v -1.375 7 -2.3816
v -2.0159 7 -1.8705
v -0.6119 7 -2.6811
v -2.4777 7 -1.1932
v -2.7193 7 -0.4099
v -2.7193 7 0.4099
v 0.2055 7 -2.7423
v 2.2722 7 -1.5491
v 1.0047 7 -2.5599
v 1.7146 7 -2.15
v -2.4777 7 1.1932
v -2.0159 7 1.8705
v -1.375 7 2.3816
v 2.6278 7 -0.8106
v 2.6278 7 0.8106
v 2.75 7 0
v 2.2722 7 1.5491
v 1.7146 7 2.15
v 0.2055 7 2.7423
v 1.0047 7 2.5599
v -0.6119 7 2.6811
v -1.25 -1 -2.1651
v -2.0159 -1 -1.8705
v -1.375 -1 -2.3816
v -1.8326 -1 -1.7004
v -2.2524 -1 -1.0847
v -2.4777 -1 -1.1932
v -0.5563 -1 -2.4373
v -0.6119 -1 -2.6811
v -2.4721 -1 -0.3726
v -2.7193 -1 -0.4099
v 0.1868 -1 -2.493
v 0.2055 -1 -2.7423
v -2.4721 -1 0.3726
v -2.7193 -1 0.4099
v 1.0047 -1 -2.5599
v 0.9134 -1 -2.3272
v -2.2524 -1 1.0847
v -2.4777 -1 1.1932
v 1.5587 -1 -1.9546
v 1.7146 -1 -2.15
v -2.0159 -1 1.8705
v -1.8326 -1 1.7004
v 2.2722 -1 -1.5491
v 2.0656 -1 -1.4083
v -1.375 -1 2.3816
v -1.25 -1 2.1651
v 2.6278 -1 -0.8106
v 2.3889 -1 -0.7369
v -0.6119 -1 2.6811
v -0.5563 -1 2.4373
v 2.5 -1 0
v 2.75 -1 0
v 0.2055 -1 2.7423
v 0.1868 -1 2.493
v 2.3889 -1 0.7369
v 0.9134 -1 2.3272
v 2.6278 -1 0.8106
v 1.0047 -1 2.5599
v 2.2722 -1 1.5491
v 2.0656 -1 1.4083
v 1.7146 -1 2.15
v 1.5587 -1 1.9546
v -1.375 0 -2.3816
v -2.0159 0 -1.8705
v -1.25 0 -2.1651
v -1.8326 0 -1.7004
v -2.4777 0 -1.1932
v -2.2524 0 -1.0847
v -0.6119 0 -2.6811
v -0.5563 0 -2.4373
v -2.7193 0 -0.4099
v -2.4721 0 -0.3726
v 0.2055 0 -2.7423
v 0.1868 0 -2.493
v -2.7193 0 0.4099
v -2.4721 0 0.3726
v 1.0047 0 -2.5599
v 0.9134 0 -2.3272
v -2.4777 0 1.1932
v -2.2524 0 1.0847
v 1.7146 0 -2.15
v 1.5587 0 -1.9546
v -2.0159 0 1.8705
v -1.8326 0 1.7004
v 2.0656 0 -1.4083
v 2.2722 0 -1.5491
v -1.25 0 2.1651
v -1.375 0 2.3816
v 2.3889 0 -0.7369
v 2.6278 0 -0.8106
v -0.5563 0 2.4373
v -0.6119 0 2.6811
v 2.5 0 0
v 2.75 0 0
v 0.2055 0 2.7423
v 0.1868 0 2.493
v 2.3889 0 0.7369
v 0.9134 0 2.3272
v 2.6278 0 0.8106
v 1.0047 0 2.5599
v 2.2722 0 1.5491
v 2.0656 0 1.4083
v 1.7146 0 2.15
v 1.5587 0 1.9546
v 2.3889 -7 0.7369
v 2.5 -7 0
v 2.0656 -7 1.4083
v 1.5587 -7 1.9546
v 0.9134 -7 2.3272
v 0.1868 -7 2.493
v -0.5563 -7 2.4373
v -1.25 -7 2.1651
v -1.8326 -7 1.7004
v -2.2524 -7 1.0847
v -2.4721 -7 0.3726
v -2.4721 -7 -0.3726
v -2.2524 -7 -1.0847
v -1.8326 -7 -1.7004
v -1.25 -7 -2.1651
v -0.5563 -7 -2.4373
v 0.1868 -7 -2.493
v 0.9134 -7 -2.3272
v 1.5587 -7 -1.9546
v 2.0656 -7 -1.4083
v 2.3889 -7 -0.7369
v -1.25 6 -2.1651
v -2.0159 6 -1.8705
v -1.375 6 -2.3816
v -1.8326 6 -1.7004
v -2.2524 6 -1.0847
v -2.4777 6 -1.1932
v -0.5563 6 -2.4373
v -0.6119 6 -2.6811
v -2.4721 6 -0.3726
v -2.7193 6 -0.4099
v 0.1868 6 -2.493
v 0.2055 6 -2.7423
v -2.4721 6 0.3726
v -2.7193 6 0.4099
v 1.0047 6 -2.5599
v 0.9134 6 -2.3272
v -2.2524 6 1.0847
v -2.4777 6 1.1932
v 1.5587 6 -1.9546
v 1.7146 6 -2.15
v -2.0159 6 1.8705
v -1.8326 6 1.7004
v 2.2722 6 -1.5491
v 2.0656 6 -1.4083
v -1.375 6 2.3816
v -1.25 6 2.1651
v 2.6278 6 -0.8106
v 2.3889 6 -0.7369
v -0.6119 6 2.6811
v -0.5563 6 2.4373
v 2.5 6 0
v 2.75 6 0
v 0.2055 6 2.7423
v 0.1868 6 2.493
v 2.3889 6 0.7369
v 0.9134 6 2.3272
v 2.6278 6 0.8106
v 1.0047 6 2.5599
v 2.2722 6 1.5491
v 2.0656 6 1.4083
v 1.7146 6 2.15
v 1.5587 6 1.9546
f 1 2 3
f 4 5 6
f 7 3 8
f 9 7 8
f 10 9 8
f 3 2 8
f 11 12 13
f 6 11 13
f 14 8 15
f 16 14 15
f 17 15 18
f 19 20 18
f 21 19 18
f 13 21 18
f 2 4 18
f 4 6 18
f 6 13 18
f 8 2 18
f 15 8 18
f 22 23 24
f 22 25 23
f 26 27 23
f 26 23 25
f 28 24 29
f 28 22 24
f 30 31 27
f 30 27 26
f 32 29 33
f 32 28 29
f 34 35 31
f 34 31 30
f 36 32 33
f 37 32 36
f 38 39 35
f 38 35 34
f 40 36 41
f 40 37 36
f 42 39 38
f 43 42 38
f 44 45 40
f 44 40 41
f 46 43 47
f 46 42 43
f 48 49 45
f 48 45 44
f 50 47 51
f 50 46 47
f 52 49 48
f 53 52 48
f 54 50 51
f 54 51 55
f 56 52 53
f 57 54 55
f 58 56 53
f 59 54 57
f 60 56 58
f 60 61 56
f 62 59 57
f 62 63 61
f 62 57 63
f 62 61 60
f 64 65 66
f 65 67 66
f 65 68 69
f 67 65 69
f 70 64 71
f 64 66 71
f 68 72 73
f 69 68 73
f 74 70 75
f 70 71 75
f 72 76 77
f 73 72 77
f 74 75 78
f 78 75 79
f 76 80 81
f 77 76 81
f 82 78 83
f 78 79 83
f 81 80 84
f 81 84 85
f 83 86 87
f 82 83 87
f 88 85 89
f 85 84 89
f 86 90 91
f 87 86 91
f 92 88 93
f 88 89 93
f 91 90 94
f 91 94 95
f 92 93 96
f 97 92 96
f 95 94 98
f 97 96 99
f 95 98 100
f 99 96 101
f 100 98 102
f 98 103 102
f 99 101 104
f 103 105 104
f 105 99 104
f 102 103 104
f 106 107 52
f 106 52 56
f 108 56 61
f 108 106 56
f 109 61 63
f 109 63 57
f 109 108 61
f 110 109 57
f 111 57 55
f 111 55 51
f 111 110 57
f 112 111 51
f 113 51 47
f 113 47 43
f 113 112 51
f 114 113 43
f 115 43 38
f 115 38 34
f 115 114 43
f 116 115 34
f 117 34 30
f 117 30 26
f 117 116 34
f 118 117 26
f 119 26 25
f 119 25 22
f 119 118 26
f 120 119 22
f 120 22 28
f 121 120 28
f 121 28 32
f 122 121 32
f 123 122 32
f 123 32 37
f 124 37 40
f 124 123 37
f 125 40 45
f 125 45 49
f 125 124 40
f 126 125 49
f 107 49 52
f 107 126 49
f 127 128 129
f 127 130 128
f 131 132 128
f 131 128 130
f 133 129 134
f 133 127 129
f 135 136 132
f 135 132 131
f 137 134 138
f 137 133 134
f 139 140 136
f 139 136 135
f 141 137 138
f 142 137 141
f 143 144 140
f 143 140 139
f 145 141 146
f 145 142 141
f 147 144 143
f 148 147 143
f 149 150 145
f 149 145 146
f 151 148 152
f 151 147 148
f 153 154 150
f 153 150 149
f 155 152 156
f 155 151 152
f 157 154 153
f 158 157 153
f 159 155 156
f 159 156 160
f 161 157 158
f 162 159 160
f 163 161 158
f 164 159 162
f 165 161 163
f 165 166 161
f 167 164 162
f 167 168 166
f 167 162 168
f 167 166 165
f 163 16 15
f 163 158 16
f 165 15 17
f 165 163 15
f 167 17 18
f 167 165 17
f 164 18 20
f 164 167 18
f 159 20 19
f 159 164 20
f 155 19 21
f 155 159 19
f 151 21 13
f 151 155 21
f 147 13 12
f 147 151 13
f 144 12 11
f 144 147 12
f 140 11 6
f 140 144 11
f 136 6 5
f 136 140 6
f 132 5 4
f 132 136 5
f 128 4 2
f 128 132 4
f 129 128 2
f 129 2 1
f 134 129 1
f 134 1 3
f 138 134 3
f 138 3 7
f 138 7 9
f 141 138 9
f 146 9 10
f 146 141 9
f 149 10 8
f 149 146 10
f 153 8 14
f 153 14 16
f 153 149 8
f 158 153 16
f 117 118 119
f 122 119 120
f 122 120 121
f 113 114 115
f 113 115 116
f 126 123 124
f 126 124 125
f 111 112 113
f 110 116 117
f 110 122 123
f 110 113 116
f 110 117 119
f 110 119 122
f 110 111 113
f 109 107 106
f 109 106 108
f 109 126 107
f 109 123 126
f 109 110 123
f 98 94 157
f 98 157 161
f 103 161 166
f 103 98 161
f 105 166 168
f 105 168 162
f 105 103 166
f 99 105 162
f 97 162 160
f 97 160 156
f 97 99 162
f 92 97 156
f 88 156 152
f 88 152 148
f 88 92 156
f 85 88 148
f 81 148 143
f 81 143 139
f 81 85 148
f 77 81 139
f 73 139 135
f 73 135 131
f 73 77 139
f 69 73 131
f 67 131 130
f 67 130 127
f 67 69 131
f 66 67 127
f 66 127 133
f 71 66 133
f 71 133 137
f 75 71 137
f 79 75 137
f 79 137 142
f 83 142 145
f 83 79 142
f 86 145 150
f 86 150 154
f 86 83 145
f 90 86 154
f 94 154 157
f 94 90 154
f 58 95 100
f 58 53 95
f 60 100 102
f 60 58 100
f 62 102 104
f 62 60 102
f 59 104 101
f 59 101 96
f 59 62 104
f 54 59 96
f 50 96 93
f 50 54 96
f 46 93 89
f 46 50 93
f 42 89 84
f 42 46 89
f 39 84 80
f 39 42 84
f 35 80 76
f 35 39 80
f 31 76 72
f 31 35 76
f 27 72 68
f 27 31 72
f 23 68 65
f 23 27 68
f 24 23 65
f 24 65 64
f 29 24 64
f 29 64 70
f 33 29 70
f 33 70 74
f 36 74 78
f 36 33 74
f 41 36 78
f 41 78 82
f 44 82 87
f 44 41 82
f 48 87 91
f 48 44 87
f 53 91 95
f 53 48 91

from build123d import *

# Parameters (mm, degrees)
F0_R     = 2.75
F1_DEPTH = 7
F2_R     = 2.75
F2_R_2   = 2.5
F3_DEPTH = 6
F4_R     = 2.75
F4_R_2   = 2.5
F5_DEPTH = 6


with BuildPart() as f1:
    # F0 (on Front) → F1 (new body, symmetric)
    with BuildSketch(Plane.XZ):
        Circle(F0_R)
    extrude(amount=F1_DEPTH, both=True)

    # F2 (on face) → F3 (cut)
    with BuildSketch(Plane.XZ.offset(7)):
        Circle(F2_R)
        Circle(F2_R_2, mode=Mode.SUBTRACT)
    extrude(amount=-F3_DEPTH, mode=Mode.SUBTRACT)

    # F4 (on Front) → F5 (cut)
    with BuildSketch(Plane.XZ):
        Circle(F4_R)
        Circle(F4_R_2, mode=Mode.SUBTRACT)
    extrude(amount=-F5_DEPTH, mode=Mode.SUBTRACT)


solid = f1.part
